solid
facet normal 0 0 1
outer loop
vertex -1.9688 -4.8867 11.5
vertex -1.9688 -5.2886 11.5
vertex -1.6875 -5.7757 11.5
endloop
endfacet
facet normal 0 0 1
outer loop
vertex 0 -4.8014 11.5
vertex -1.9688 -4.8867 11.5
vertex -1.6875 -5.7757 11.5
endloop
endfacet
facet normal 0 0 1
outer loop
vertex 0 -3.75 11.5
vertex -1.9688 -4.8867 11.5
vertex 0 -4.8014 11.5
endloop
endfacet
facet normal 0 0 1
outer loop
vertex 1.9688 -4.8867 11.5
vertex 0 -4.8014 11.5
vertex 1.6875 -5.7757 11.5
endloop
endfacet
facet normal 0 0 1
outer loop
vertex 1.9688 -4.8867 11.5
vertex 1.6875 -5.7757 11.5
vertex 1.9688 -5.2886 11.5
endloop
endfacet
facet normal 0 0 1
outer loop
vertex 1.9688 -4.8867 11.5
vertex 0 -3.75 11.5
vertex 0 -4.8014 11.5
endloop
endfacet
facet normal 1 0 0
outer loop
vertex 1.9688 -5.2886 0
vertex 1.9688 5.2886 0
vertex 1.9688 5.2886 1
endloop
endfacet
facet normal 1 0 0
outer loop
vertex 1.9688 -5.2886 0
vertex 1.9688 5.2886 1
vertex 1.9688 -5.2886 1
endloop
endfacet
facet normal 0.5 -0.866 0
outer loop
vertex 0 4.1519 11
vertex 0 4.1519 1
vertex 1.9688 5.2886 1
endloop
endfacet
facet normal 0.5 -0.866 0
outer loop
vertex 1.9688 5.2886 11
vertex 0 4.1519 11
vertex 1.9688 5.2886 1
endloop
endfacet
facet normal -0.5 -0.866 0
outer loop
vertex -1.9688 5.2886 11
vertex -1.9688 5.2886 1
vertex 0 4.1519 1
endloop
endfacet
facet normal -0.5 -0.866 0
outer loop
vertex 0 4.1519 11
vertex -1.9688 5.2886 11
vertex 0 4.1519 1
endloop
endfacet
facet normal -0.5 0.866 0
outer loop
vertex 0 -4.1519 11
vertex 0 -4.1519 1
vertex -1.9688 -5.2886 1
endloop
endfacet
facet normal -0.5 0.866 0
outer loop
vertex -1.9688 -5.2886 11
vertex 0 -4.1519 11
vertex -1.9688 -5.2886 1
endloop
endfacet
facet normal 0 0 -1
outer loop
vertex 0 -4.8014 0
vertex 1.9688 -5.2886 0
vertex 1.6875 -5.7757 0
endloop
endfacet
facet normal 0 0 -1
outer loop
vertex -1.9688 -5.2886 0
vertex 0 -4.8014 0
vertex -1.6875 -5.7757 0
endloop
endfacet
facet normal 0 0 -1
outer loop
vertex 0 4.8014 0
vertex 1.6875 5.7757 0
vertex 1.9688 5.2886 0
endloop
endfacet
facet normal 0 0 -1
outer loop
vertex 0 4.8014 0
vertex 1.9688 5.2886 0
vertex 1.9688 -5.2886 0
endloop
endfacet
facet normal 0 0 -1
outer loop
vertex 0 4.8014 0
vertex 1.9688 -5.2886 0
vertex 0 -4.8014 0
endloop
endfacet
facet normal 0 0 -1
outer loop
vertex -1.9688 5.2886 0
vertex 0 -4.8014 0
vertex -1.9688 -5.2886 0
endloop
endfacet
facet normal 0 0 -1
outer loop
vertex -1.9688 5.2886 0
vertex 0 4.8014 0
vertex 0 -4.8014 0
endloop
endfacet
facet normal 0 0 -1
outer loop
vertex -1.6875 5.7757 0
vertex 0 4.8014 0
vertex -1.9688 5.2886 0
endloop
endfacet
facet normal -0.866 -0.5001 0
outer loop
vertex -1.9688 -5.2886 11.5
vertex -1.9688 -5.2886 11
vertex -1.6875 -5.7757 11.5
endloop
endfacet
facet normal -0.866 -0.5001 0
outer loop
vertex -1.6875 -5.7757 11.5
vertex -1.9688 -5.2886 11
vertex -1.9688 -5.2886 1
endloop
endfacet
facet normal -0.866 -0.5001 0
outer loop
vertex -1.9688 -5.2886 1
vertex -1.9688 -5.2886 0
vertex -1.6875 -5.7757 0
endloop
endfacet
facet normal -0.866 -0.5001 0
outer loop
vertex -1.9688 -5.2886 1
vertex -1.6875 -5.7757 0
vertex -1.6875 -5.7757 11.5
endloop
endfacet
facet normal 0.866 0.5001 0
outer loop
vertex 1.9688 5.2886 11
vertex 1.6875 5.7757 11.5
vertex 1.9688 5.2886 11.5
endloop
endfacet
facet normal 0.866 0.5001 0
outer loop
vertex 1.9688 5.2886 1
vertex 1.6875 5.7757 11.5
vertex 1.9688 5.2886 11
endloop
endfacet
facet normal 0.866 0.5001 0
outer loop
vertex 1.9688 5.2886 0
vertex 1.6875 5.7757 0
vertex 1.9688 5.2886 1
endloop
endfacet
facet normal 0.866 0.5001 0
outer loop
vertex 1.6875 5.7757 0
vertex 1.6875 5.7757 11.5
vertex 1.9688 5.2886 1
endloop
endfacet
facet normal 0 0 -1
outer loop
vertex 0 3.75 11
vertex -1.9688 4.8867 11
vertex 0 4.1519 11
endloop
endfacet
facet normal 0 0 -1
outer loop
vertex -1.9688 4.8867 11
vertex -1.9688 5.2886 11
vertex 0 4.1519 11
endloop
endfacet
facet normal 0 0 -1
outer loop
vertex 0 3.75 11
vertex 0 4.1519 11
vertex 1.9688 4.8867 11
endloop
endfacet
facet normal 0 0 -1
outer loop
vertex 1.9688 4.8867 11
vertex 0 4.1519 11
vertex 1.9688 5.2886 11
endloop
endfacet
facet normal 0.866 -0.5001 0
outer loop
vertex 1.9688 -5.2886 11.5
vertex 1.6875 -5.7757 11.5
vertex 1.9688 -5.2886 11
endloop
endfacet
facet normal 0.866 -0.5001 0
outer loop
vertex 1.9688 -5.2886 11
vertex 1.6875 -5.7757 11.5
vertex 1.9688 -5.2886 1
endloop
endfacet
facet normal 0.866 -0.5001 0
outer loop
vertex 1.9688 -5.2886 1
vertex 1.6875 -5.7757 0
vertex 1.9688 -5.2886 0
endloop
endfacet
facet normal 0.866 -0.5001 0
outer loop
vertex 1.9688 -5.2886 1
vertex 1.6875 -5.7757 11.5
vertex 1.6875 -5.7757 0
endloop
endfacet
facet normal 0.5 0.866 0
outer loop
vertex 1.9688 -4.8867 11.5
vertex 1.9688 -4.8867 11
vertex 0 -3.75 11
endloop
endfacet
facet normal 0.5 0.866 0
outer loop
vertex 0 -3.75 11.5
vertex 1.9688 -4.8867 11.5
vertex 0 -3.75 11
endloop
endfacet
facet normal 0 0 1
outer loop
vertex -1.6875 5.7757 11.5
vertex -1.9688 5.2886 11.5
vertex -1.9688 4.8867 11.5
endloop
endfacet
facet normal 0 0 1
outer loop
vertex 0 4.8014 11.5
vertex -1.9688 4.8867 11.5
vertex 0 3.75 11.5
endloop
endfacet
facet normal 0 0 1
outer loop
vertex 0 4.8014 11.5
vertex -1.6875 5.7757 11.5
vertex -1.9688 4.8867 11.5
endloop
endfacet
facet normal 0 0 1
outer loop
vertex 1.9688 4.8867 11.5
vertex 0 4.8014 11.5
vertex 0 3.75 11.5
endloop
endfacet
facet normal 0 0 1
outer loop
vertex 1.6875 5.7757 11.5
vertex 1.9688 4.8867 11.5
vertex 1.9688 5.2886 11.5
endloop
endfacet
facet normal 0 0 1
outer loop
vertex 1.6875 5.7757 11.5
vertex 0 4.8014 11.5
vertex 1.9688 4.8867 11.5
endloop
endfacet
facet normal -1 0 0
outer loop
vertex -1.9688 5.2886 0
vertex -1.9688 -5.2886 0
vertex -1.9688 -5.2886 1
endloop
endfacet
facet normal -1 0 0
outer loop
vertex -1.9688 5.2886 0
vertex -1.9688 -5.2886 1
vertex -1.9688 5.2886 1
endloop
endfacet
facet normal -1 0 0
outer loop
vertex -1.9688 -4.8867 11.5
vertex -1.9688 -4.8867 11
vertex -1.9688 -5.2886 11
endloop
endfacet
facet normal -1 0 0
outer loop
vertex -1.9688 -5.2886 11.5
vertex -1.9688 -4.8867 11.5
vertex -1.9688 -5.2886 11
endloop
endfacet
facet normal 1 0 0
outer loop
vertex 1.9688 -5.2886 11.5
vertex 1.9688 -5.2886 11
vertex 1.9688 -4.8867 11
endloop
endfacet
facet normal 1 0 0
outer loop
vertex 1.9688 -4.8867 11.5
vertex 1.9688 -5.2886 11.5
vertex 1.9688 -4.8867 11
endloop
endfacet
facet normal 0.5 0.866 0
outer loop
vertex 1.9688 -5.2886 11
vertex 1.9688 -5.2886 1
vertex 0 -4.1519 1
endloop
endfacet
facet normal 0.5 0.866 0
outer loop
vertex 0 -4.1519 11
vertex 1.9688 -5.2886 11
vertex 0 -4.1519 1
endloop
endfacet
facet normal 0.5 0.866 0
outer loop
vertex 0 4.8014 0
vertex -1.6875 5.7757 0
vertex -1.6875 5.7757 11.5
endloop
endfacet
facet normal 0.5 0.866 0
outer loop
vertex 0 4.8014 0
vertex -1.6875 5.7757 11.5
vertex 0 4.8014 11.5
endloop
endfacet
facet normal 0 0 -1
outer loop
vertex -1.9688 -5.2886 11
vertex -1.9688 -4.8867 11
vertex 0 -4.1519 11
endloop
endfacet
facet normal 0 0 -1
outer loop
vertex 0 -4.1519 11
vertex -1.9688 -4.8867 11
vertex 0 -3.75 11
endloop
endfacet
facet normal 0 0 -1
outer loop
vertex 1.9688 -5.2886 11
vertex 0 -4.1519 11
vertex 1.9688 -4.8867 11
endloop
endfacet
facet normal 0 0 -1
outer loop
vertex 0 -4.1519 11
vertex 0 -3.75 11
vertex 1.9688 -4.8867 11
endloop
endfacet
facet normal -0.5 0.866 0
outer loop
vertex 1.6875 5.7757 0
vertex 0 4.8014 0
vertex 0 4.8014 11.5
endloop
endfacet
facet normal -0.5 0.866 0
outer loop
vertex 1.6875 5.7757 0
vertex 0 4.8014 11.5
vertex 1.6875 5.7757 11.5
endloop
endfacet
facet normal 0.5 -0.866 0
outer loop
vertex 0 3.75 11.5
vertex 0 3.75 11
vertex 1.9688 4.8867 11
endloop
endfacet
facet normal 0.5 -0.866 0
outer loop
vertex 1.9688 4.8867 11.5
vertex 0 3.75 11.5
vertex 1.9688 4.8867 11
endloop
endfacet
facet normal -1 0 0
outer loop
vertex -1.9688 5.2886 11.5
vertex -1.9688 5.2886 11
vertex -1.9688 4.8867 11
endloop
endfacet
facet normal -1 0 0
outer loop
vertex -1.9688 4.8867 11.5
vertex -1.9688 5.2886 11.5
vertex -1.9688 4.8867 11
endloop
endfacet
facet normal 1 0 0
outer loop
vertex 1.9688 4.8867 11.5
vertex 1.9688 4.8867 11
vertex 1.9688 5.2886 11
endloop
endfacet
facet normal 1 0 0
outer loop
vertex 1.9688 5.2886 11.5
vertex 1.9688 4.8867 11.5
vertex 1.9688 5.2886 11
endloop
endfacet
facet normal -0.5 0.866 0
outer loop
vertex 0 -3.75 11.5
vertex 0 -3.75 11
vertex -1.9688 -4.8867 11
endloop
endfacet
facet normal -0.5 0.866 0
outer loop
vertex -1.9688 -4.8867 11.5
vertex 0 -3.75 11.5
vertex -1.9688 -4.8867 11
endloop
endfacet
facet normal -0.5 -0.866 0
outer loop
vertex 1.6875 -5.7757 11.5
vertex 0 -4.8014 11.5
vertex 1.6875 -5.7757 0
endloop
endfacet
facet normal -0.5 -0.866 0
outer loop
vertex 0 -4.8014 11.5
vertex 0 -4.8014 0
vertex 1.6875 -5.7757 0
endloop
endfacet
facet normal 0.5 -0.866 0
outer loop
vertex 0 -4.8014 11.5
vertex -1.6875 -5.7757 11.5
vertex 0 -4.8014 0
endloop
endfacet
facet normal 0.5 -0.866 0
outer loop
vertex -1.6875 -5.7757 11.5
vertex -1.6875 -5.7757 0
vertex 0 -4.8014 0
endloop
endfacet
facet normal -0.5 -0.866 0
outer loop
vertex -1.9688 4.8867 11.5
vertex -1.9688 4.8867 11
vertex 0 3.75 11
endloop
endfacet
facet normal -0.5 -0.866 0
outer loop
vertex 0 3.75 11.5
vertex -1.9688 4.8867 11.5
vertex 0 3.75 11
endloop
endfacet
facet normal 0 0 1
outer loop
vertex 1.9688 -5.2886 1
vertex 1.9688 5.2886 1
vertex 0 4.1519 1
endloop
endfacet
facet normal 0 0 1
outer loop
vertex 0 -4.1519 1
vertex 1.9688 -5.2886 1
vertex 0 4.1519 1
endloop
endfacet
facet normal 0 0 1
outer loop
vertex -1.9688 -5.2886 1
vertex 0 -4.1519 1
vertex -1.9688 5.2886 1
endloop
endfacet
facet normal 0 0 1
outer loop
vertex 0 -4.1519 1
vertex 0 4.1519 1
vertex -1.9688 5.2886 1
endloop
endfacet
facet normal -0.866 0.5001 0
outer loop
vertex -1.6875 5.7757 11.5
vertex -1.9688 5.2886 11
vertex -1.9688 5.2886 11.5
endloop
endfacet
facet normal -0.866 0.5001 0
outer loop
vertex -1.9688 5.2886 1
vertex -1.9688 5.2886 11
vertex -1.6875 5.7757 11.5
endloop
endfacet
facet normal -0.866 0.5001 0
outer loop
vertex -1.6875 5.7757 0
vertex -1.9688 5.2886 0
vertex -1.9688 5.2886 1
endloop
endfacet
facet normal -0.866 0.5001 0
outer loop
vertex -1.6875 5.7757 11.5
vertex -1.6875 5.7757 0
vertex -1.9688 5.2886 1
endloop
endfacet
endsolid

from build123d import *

# Parameters (mm, degrees)
BOSS_EXTRUDE1_DEPTH = 1
BOSS_EXTRUDE2_DEPTH = 11
BOSS_EXTRUDE4_DEPTH = 0.5


with BuildPart() as part:
    # Sketch1 → Boss-Extrude1 (new body)
    with BuildSketch(Plane.XY):
        Polygon((0, 4.801442841), (1.6875, 5.775721421), (1.96875, 5.288582131), (1.96875, -5.288582131), (1.6875, -5.775721421), (0, -4.801442841), (-1.6875, -5.775721421), (-1.96875, -5.288582131), (-1.96875, 5.288582131), (-1.6875, 5.775721421), align=None)
    extrude(amount=BOSS_EXTRUDE1_DEPTH)

    # Sketch2 → Boss-Extrude2 (add)
    with BuildSketch(Plane.XY):
        Polygon((0, -4.801442841), (0, -4.151923789), (-1.96875, -5.288582131), (-1.6875, -5.775721421), align=None)
        Polygon((1.96875, -5.288582131), (0, -4.151923789), (0, -4.801442841), (1.6875, -5.775721421), align=None)
        Polygon((-1.96875, 5.288582131), (0, 4.151923789), (0, 4.801442841), (-1.6875, 5.775721421), align=None)
        Polygon((0, 4.801442841), (0, 4.151923789), (1.96875, 5.288582131), (1.6875, 5.775721421), align=None)
    extrude(amount=BOSS_EXTRUDE2_DEPTH)

    # Sketch5 → Boss-Extrude4 (add)
    with BuildSketch(Plane.XY.offset(11)):
        Polygon((1.96875, -4.886658342), (0, -3.75), (0, -4.151923789), (1.96875, -5.288582131), align=None)
        Polygon((1.96875, -5.288582131), (0, -4.151923789), (0, -4.801442841), (1.6875, -5.775721421), align=None)
        Polygon((0, -4.801442841), (0, -4.151923789), (-1.96875, -5.288582131), (-1.6875, -5.775721421), align=None)
        Polygon((0, -4.151923789), (0, -3.75), (-1.96875, -4.886658342), (-1.96875, -5.288582131), align=None)
        Polygon((0, 4.801442841), (0, 4.151923789), (1.96875, 5.288582131), (1.6875, 5.775721421), align=None)
        Polygon((0, 4.151923789), (0, 3.75), (1.96875, 4.886658342), (1.96875, 5.288582131), align=None)
        Polygon((-1.96875, 5.288582131), (0, 4.151923789), (0, 4.801442841), (-1.6875, 5.775721421), align=None)
        Polygon((-1.96875, 4.886658342), (0, 3.75), (0, 4.151923789), (-1.96875, 5.288582131), align=None)
    extrude(amount=BOSS_EXTRUDE4_DEPTH)


solid = part.part
